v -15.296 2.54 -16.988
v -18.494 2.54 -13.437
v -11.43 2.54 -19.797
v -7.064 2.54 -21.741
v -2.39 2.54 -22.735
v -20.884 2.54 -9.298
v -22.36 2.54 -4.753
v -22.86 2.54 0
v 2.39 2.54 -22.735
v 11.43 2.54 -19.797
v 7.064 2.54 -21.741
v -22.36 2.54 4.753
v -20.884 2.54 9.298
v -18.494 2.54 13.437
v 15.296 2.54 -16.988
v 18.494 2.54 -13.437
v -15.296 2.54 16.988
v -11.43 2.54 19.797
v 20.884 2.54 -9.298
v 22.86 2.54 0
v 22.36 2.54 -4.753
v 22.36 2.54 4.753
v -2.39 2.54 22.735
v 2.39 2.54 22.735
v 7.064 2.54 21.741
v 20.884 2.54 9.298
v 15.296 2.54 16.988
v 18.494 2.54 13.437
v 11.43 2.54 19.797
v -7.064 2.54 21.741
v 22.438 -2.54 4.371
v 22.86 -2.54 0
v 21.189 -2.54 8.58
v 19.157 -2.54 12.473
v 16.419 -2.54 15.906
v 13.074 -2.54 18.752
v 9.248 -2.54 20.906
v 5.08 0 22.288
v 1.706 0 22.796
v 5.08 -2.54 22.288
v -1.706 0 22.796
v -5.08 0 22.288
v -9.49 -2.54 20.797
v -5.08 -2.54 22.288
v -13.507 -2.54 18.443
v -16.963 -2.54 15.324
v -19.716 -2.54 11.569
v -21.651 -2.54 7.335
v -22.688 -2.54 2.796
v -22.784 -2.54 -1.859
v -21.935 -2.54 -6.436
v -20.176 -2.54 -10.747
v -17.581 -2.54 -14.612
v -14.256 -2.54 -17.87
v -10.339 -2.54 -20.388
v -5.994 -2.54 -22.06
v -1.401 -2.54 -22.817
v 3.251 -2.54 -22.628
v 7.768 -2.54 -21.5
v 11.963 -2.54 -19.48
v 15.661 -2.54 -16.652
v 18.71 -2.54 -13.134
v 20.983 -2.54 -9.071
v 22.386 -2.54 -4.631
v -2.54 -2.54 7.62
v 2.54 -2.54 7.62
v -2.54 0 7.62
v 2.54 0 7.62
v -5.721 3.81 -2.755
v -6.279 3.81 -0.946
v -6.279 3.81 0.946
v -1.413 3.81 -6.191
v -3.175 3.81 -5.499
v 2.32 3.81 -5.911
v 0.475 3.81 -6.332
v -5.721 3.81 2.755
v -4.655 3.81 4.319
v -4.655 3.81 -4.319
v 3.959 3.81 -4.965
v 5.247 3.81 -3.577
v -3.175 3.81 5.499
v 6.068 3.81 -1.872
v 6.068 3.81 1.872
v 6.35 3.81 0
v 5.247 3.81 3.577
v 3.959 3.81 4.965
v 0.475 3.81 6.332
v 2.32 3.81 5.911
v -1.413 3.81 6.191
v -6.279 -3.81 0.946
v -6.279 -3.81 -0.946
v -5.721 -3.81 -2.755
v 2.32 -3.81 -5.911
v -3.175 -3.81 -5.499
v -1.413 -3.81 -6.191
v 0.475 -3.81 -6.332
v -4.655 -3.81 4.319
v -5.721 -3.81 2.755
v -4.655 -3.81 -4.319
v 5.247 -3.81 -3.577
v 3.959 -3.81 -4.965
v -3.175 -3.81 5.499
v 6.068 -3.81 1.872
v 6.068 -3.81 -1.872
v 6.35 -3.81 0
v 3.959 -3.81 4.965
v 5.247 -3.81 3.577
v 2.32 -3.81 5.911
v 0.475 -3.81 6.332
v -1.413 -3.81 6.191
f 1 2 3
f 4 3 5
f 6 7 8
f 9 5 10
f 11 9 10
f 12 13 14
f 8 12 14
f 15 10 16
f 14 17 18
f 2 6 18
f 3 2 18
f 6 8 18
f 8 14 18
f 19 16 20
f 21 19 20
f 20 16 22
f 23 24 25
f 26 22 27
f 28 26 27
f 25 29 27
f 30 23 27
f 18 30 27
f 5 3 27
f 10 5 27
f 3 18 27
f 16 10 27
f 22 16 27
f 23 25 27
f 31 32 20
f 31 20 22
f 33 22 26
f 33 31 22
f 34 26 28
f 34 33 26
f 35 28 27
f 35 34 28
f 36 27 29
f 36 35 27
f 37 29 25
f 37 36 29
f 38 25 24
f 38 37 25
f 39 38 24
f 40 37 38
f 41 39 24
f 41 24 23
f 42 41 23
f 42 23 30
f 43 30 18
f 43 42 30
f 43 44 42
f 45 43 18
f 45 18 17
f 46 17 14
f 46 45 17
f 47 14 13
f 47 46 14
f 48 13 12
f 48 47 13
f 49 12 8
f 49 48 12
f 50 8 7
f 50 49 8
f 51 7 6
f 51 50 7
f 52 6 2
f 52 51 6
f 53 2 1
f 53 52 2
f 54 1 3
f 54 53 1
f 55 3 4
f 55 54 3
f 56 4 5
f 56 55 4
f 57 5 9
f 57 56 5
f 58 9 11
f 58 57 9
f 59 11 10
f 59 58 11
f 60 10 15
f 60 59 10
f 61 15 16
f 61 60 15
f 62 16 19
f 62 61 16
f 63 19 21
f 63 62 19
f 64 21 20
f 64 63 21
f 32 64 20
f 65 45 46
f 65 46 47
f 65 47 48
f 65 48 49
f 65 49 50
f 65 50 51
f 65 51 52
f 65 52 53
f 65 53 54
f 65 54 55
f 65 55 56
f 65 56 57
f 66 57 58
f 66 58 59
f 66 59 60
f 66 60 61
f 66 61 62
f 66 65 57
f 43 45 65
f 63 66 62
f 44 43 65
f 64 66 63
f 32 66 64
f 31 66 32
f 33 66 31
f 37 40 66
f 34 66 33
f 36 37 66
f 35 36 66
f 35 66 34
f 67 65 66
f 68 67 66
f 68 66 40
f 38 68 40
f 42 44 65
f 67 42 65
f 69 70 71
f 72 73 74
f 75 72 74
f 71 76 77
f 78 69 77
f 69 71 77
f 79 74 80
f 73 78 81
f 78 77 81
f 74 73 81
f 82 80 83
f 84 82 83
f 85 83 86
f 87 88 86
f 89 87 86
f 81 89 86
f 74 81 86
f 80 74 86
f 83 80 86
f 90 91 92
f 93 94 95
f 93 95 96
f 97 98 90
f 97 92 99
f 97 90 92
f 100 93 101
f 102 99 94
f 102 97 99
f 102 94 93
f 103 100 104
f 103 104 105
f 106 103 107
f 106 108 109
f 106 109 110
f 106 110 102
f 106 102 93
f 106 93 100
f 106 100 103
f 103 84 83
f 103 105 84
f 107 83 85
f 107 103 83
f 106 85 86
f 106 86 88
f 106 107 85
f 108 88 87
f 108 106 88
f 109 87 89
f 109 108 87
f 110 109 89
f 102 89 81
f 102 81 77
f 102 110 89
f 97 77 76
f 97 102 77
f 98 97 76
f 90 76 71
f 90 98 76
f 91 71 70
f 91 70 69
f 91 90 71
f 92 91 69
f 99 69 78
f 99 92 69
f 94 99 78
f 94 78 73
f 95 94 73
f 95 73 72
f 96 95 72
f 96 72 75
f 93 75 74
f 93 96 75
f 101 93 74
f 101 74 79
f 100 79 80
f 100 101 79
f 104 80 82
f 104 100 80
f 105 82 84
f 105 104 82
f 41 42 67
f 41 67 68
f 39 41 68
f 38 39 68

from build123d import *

# Parameters (mm, degrees)
F0_R     = 6.35
F2_DEPTH = 3.81
F1_R     = 22.86
F3_DEPTH = 2.54
F5_DEPTH = 2.54


with BuildPart() as f2:
    # F0 (on Front) → F2 (new body, symmetric)
    with BuildSketch(Plane.XZ):
        Circle(F0_R)
    extrude(amount=F2_DEPTH, both=True)


with BuildPart() as f3:
    # F1 (on Front) → F3 (new body, symmetric)
    with BuildSketch(Plane.XZ):
        Circle(F1_R)
    extrude(amount=F3_DEPTH, both=True)

    # F4 (on face) → F5 (cut)
    with BuildSketch(Plane.XZ.offset(2.54)):
        with BuildLine():
            Line((-5.08, 22.288409544), (-2.54, 7.62))
            Line((-2.54, 7.62), (2.54, 7.62))
            Line((2.54, 7.62), (5.08, 22.288409544))
            ThreePointArc((5.08, 22.288409544), (0, 22.86), (-5.08, 22.288409544))
        make_face()
    extrude(amount=-F5_DEPTH, mode=Mode.SUBTRACT)


solid = Compound([f2.part, f3.part])
